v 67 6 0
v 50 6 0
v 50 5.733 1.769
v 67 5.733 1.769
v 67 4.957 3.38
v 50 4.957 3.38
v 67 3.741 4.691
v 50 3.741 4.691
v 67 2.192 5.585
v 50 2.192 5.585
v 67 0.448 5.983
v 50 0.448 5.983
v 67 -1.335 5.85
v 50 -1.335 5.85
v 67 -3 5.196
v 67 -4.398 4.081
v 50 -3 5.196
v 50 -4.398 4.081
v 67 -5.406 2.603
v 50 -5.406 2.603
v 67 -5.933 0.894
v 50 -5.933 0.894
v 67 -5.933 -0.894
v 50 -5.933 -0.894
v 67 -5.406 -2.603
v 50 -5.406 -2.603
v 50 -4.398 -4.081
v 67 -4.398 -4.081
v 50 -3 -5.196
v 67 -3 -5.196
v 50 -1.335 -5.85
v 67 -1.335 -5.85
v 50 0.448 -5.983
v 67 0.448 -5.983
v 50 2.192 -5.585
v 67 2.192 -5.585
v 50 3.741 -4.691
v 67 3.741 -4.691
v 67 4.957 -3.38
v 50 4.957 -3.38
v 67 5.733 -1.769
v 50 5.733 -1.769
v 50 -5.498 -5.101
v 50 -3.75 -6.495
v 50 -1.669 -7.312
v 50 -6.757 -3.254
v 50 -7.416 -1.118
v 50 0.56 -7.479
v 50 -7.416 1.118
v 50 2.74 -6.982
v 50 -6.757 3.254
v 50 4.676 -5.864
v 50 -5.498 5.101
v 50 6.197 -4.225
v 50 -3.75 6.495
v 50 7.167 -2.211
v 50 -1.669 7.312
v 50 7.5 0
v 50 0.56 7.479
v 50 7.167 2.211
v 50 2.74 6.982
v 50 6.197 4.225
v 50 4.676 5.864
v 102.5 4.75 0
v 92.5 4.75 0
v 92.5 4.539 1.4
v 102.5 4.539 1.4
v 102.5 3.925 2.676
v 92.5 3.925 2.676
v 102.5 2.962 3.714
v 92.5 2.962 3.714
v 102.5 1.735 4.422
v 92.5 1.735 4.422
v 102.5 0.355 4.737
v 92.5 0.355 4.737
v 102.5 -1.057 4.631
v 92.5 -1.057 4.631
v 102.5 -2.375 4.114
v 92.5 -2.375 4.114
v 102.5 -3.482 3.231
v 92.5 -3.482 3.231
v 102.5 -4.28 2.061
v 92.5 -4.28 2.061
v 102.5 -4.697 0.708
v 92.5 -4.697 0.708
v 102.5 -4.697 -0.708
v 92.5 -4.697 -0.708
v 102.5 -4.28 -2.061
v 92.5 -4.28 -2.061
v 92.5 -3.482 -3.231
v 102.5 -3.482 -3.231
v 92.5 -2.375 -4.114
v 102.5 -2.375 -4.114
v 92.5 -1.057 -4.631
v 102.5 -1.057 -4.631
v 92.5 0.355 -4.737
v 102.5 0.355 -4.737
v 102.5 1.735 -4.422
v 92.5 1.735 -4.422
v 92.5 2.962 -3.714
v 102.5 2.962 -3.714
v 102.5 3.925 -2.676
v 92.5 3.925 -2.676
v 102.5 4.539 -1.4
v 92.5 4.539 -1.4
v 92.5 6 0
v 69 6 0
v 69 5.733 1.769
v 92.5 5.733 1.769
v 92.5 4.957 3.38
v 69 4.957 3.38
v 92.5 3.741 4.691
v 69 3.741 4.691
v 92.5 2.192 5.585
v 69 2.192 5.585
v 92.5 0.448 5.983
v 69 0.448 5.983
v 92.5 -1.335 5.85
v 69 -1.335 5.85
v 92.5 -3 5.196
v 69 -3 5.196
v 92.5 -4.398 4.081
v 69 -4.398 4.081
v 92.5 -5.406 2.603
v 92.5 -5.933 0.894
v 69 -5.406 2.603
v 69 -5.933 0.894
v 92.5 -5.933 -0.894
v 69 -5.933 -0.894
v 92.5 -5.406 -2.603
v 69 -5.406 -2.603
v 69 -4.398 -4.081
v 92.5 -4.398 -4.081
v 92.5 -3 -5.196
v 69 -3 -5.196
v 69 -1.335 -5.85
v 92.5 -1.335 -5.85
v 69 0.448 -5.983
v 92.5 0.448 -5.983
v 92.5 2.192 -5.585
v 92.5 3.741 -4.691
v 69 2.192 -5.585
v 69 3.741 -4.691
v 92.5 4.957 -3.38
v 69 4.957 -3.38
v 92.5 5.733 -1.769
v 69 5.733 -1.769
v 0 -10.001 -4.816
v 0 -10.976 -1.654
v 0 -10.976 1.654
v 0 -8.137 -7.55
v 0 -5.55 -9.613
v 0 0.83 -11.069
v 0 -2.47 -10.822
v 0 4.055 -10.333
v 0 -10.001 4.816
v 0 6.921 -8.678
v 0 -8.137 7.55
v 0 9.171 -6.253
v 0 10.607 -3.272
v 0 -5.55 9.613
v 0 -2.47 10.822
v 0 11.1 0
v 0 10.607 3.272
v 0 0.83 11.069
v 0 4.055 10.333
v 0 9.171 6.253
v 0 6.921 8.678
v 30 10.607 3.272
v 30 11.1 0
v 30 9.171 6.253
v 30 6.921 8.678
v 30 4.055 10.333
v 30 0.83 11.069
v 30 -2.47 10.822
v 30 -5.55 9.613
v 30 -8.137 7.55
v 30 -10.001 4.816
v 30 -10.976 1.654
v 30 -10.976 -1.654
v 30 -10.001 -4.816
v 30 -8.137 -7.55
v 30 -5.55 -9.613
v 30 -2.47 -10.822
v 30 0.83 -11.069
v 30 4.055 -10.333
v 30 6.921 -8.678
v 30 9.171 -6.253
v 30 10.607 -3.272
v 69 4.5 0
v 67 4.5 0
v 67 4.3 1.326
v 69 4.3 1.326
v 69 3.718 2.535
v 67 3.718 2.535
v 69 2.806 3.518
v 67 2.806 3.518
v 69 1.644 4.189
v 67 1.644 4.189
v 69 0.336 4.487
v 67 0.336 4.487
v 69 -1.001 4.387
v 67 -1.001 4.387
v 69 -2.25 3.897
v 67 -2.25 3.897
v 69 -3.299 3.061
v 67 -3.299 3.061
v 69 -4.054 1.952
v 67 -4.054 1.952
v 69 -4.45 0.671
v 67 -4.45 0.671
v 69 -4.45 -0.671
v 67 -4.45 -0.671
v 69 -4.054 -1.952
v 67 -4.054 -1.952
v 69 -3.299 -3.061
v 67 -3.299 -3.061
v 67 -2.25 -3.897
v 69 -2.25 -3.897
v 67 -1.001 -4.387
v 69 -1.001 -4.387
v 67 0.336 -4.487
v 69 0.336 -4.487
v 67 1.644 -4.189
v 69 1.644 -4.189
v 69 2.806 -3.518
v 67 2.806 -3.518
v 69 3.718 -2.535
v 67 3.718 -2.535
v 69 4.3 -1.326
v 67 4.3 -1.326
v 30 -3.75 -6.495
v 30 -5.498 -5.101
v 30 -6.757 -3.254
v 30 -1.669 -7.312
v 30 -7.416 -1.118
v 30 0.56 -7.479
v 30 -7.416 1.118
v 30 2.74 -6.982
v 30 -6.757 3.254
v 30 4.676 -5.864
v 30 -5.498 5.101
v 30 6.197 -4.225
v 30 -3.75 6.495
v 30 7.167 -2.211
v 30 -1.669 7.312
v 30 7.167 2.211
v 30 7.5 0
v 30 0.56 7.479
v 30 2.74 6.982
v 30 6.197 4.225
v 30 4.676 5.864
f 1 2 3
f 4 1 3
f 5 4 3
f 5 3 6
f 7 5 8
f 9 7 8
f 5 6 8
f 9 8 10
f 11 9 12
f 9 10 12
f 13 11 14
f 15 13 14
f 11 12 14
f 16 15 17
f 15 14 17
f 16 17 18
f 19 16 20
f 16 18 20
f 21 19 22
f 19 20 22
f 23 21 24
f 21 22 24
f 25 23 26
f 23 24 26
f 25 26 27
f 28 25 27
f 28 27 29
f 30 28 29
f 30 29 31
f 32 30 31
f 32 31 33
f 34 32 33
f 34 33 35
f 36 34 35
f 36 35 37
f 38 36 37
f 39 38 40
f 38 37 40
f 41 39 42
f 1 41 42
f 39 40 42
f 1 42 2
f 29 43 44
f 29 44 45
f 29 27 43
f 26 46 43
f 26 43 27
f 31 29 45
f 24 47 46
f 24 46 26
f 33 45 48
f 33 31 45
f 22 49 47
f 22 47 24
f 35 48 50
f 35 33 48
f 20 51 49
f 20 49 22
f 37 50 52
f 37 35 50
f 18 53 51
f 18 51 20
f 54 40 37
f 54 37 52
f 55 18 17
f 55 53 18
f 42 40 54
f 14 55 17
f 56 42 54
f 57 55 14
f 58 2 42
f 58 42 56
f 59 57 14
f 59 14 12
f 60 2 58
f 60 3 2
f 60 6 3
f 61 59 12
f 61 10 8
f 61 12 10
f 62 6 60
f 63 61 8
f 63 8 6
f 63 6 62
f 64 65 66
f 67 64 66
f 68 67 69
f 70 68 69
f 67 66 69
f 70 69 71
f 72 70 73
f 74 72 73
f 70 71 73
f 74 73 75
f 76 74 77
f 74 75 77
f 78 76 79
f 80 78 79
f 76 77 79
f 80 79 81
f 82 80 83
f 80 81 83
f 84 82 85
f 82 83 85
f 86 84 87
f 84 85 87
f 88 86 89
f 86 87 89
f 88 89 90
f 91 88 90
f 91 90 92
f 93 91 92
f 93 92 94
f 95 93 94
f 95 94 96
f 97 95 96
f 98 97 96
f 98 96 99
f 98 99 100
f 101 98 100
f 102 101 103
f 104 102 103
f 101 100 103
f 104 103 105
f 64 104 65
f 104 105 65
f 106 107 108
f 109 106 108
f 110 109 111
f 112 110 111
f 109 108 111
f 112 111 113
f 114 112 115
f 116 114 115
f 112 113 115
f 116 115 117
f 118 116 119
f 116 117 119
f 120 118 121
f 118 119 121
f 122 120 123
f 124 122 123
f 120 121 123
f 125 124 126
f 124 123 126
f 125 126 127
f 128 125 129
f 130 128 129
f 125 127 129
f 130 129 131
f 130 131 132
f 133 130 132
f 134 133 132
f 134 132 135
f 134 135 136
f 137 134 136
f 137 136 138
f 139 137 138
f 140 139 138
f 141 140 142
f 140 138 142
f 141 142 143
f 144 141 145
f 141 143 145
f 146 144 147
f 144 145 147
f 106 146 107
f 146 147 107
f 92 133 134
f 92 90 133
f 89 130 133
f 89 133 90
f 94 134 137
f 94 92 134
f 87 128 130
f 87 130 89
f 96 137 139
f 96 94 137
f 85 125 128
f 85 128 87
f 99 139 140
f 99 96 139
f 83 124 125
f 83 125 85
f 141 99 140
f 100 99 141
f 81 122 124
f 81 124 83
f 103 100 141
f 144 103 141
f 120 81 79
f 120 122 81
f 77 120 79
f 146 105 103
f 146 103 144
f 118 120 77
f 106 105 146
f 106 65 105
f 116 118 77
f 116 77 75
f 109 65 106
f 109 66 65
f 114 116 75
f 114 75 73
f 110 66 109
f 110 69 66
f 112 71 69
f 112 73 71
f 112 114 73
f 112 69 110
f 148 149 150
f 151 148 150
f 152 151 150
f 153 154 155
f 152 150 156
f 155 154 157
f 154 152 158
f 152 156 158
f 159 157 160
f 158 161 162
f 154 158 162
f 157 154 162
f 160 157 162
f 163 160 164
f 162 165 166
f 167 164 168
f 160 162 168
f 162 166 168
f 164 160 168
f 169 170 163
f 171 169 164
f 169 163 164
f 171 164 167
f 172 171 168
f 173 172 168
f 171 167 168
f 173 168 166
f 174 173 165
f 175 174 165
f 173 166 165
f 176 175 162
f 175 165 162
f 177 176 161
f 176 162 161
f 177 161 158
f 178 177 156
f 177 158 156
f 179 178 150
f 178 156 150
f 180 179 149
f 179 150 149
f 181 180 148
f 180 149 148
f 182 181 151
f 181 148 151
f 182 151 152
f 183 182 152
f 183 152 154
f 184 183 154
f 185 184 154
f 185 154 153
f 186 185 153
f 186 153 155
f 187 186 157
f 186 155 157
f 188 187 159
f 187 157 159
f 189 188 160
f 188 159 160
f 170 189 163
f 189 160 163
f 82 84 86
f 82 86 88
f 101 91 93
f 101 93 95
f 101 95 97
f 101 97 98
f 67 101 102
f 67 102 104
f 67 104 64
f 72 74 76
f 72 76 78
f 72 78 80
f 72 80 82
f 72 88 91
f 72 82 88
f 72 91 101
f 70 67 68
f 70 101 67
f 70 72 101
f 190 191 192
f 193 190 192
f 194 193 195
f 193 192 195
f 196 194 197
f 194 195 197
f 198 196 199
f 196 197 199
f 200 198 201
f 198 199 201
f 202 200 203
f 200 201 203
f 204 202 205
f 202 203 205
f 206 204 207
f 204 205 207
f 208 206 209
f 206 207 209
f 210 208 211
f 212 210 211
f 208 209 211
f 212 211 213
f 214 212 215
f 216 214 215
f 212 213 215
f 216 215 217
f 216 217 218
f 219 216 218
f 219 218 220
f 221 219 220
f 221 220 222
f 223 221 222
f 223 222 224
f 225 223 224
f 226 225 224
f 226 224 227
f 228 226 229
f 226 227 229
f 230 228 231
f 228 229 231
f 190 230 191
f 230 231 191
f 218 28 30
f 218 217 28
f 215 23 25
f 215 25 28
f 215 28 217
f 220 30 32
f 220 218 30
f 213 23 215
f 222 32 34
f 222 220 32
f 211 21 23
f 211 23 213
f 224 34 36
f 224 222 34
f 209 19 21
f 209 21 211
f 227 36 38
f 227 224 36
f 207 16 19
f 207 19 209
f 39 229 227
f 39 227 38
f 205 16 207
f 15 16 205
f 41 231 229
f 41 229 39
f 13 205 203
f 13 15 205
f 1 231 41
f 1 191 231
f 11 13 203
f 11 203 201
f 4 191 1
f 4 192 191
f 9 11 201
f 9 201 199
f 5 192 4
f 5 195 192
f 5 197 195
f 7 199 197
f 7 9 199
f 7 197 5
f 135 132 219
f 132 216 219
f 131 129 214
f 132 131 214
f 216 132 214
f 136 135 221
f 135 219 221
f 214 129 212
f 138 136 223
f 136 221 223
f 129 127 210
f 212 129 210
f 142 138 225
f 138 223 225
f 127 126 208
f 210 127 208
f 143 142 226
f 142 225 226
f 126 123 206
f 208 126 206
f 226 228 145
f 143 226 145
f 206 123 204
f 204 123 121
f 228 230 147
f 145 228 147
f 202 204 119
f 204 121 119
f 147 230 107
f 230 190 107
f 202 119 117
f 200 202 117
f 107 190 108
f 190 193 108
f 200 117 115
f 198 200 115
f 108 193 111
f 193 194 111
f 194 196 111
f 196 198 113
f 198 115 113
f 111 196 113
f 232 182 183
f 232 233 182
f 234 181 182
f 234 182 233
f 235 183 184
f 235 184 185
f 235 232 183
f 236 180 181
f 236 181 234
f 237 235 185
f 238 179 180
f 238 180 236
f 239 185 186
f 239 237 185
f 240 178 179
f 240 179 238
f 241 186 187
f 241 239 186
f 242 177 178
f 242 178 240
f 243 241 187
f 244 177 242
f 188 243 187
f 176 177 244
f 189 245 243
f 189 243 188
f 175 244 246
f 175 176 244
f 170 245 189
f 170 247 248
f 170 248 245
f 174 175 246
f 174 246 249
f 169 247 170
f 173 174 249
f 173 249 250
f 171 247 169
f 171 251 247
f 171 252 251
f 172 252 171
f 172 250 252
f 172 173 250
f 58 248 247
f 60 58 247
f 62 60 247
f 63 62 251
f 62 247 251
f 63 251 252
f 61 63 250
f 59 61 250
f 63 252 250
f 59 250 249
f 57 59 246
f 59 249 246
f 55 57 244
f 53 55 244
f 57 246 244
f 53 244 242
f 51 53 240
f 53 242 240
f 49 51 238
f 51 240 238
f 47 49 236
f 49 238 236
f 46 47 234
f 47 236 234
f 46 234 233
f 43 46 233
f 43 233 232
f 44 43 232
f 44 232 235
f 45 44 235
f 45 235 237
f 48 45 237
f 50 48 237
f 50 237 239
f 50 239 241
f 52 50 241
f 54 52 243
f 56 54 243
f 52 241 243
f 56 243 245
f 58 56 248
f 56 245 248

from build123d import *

# Parameters (mm, degrees)
F0_R      = 11.1
F1_DEPTH  = 30
F2_R      = 7.5
F3_DEPTH  = 20
F4_R      = 6
F5_DEPTH  = 17
F6_R      = 4.5
F7_DEPTH  = 2
F8_R      = 6
F9_DEPTH  = 23.5
F10_R     = 4.75
F11_DEPTH = 10


with BuildPart() as f1:
    # F0 (on Right) → F1 (new body)
    with BuildSketch(Plane.YZ):
        Circle(F0_R)
    extrude(amount=F1_DEPTH)

    # F2 (on face) → F3 (join)
    with BuildSketch(Plane.YZ.offset(30)):
        Circle(F2_R)
    extrude(amount=F3_DEPTH)

    # F4 (on face) → F5 (join)
    with BuildSketch(Plane.YZ.offset(50)):
        Circle(F4_R)
    extrude(amount=F5_DEPTH)

    # F6 (on face) → F7 (join)
    with BuildSketch(Plane.YZ.offset(67)):
        Circle(F6_R)
    extrude(amount=F7_DEPTH)

    # F8 (on face) → F9 (join)
    with BuildSketch(Plane.YZ.offset(69)):
        Circle(F8_R)
    extrude(amount=F9_DEPTH)

    # F10 (on face) → F11 (join)
    with BuildSketch(Plane.YZ.offset(92.5)):
        Circle(F10_R)
    extrude(amount=F11_DEPTH)


solid = f1.part
